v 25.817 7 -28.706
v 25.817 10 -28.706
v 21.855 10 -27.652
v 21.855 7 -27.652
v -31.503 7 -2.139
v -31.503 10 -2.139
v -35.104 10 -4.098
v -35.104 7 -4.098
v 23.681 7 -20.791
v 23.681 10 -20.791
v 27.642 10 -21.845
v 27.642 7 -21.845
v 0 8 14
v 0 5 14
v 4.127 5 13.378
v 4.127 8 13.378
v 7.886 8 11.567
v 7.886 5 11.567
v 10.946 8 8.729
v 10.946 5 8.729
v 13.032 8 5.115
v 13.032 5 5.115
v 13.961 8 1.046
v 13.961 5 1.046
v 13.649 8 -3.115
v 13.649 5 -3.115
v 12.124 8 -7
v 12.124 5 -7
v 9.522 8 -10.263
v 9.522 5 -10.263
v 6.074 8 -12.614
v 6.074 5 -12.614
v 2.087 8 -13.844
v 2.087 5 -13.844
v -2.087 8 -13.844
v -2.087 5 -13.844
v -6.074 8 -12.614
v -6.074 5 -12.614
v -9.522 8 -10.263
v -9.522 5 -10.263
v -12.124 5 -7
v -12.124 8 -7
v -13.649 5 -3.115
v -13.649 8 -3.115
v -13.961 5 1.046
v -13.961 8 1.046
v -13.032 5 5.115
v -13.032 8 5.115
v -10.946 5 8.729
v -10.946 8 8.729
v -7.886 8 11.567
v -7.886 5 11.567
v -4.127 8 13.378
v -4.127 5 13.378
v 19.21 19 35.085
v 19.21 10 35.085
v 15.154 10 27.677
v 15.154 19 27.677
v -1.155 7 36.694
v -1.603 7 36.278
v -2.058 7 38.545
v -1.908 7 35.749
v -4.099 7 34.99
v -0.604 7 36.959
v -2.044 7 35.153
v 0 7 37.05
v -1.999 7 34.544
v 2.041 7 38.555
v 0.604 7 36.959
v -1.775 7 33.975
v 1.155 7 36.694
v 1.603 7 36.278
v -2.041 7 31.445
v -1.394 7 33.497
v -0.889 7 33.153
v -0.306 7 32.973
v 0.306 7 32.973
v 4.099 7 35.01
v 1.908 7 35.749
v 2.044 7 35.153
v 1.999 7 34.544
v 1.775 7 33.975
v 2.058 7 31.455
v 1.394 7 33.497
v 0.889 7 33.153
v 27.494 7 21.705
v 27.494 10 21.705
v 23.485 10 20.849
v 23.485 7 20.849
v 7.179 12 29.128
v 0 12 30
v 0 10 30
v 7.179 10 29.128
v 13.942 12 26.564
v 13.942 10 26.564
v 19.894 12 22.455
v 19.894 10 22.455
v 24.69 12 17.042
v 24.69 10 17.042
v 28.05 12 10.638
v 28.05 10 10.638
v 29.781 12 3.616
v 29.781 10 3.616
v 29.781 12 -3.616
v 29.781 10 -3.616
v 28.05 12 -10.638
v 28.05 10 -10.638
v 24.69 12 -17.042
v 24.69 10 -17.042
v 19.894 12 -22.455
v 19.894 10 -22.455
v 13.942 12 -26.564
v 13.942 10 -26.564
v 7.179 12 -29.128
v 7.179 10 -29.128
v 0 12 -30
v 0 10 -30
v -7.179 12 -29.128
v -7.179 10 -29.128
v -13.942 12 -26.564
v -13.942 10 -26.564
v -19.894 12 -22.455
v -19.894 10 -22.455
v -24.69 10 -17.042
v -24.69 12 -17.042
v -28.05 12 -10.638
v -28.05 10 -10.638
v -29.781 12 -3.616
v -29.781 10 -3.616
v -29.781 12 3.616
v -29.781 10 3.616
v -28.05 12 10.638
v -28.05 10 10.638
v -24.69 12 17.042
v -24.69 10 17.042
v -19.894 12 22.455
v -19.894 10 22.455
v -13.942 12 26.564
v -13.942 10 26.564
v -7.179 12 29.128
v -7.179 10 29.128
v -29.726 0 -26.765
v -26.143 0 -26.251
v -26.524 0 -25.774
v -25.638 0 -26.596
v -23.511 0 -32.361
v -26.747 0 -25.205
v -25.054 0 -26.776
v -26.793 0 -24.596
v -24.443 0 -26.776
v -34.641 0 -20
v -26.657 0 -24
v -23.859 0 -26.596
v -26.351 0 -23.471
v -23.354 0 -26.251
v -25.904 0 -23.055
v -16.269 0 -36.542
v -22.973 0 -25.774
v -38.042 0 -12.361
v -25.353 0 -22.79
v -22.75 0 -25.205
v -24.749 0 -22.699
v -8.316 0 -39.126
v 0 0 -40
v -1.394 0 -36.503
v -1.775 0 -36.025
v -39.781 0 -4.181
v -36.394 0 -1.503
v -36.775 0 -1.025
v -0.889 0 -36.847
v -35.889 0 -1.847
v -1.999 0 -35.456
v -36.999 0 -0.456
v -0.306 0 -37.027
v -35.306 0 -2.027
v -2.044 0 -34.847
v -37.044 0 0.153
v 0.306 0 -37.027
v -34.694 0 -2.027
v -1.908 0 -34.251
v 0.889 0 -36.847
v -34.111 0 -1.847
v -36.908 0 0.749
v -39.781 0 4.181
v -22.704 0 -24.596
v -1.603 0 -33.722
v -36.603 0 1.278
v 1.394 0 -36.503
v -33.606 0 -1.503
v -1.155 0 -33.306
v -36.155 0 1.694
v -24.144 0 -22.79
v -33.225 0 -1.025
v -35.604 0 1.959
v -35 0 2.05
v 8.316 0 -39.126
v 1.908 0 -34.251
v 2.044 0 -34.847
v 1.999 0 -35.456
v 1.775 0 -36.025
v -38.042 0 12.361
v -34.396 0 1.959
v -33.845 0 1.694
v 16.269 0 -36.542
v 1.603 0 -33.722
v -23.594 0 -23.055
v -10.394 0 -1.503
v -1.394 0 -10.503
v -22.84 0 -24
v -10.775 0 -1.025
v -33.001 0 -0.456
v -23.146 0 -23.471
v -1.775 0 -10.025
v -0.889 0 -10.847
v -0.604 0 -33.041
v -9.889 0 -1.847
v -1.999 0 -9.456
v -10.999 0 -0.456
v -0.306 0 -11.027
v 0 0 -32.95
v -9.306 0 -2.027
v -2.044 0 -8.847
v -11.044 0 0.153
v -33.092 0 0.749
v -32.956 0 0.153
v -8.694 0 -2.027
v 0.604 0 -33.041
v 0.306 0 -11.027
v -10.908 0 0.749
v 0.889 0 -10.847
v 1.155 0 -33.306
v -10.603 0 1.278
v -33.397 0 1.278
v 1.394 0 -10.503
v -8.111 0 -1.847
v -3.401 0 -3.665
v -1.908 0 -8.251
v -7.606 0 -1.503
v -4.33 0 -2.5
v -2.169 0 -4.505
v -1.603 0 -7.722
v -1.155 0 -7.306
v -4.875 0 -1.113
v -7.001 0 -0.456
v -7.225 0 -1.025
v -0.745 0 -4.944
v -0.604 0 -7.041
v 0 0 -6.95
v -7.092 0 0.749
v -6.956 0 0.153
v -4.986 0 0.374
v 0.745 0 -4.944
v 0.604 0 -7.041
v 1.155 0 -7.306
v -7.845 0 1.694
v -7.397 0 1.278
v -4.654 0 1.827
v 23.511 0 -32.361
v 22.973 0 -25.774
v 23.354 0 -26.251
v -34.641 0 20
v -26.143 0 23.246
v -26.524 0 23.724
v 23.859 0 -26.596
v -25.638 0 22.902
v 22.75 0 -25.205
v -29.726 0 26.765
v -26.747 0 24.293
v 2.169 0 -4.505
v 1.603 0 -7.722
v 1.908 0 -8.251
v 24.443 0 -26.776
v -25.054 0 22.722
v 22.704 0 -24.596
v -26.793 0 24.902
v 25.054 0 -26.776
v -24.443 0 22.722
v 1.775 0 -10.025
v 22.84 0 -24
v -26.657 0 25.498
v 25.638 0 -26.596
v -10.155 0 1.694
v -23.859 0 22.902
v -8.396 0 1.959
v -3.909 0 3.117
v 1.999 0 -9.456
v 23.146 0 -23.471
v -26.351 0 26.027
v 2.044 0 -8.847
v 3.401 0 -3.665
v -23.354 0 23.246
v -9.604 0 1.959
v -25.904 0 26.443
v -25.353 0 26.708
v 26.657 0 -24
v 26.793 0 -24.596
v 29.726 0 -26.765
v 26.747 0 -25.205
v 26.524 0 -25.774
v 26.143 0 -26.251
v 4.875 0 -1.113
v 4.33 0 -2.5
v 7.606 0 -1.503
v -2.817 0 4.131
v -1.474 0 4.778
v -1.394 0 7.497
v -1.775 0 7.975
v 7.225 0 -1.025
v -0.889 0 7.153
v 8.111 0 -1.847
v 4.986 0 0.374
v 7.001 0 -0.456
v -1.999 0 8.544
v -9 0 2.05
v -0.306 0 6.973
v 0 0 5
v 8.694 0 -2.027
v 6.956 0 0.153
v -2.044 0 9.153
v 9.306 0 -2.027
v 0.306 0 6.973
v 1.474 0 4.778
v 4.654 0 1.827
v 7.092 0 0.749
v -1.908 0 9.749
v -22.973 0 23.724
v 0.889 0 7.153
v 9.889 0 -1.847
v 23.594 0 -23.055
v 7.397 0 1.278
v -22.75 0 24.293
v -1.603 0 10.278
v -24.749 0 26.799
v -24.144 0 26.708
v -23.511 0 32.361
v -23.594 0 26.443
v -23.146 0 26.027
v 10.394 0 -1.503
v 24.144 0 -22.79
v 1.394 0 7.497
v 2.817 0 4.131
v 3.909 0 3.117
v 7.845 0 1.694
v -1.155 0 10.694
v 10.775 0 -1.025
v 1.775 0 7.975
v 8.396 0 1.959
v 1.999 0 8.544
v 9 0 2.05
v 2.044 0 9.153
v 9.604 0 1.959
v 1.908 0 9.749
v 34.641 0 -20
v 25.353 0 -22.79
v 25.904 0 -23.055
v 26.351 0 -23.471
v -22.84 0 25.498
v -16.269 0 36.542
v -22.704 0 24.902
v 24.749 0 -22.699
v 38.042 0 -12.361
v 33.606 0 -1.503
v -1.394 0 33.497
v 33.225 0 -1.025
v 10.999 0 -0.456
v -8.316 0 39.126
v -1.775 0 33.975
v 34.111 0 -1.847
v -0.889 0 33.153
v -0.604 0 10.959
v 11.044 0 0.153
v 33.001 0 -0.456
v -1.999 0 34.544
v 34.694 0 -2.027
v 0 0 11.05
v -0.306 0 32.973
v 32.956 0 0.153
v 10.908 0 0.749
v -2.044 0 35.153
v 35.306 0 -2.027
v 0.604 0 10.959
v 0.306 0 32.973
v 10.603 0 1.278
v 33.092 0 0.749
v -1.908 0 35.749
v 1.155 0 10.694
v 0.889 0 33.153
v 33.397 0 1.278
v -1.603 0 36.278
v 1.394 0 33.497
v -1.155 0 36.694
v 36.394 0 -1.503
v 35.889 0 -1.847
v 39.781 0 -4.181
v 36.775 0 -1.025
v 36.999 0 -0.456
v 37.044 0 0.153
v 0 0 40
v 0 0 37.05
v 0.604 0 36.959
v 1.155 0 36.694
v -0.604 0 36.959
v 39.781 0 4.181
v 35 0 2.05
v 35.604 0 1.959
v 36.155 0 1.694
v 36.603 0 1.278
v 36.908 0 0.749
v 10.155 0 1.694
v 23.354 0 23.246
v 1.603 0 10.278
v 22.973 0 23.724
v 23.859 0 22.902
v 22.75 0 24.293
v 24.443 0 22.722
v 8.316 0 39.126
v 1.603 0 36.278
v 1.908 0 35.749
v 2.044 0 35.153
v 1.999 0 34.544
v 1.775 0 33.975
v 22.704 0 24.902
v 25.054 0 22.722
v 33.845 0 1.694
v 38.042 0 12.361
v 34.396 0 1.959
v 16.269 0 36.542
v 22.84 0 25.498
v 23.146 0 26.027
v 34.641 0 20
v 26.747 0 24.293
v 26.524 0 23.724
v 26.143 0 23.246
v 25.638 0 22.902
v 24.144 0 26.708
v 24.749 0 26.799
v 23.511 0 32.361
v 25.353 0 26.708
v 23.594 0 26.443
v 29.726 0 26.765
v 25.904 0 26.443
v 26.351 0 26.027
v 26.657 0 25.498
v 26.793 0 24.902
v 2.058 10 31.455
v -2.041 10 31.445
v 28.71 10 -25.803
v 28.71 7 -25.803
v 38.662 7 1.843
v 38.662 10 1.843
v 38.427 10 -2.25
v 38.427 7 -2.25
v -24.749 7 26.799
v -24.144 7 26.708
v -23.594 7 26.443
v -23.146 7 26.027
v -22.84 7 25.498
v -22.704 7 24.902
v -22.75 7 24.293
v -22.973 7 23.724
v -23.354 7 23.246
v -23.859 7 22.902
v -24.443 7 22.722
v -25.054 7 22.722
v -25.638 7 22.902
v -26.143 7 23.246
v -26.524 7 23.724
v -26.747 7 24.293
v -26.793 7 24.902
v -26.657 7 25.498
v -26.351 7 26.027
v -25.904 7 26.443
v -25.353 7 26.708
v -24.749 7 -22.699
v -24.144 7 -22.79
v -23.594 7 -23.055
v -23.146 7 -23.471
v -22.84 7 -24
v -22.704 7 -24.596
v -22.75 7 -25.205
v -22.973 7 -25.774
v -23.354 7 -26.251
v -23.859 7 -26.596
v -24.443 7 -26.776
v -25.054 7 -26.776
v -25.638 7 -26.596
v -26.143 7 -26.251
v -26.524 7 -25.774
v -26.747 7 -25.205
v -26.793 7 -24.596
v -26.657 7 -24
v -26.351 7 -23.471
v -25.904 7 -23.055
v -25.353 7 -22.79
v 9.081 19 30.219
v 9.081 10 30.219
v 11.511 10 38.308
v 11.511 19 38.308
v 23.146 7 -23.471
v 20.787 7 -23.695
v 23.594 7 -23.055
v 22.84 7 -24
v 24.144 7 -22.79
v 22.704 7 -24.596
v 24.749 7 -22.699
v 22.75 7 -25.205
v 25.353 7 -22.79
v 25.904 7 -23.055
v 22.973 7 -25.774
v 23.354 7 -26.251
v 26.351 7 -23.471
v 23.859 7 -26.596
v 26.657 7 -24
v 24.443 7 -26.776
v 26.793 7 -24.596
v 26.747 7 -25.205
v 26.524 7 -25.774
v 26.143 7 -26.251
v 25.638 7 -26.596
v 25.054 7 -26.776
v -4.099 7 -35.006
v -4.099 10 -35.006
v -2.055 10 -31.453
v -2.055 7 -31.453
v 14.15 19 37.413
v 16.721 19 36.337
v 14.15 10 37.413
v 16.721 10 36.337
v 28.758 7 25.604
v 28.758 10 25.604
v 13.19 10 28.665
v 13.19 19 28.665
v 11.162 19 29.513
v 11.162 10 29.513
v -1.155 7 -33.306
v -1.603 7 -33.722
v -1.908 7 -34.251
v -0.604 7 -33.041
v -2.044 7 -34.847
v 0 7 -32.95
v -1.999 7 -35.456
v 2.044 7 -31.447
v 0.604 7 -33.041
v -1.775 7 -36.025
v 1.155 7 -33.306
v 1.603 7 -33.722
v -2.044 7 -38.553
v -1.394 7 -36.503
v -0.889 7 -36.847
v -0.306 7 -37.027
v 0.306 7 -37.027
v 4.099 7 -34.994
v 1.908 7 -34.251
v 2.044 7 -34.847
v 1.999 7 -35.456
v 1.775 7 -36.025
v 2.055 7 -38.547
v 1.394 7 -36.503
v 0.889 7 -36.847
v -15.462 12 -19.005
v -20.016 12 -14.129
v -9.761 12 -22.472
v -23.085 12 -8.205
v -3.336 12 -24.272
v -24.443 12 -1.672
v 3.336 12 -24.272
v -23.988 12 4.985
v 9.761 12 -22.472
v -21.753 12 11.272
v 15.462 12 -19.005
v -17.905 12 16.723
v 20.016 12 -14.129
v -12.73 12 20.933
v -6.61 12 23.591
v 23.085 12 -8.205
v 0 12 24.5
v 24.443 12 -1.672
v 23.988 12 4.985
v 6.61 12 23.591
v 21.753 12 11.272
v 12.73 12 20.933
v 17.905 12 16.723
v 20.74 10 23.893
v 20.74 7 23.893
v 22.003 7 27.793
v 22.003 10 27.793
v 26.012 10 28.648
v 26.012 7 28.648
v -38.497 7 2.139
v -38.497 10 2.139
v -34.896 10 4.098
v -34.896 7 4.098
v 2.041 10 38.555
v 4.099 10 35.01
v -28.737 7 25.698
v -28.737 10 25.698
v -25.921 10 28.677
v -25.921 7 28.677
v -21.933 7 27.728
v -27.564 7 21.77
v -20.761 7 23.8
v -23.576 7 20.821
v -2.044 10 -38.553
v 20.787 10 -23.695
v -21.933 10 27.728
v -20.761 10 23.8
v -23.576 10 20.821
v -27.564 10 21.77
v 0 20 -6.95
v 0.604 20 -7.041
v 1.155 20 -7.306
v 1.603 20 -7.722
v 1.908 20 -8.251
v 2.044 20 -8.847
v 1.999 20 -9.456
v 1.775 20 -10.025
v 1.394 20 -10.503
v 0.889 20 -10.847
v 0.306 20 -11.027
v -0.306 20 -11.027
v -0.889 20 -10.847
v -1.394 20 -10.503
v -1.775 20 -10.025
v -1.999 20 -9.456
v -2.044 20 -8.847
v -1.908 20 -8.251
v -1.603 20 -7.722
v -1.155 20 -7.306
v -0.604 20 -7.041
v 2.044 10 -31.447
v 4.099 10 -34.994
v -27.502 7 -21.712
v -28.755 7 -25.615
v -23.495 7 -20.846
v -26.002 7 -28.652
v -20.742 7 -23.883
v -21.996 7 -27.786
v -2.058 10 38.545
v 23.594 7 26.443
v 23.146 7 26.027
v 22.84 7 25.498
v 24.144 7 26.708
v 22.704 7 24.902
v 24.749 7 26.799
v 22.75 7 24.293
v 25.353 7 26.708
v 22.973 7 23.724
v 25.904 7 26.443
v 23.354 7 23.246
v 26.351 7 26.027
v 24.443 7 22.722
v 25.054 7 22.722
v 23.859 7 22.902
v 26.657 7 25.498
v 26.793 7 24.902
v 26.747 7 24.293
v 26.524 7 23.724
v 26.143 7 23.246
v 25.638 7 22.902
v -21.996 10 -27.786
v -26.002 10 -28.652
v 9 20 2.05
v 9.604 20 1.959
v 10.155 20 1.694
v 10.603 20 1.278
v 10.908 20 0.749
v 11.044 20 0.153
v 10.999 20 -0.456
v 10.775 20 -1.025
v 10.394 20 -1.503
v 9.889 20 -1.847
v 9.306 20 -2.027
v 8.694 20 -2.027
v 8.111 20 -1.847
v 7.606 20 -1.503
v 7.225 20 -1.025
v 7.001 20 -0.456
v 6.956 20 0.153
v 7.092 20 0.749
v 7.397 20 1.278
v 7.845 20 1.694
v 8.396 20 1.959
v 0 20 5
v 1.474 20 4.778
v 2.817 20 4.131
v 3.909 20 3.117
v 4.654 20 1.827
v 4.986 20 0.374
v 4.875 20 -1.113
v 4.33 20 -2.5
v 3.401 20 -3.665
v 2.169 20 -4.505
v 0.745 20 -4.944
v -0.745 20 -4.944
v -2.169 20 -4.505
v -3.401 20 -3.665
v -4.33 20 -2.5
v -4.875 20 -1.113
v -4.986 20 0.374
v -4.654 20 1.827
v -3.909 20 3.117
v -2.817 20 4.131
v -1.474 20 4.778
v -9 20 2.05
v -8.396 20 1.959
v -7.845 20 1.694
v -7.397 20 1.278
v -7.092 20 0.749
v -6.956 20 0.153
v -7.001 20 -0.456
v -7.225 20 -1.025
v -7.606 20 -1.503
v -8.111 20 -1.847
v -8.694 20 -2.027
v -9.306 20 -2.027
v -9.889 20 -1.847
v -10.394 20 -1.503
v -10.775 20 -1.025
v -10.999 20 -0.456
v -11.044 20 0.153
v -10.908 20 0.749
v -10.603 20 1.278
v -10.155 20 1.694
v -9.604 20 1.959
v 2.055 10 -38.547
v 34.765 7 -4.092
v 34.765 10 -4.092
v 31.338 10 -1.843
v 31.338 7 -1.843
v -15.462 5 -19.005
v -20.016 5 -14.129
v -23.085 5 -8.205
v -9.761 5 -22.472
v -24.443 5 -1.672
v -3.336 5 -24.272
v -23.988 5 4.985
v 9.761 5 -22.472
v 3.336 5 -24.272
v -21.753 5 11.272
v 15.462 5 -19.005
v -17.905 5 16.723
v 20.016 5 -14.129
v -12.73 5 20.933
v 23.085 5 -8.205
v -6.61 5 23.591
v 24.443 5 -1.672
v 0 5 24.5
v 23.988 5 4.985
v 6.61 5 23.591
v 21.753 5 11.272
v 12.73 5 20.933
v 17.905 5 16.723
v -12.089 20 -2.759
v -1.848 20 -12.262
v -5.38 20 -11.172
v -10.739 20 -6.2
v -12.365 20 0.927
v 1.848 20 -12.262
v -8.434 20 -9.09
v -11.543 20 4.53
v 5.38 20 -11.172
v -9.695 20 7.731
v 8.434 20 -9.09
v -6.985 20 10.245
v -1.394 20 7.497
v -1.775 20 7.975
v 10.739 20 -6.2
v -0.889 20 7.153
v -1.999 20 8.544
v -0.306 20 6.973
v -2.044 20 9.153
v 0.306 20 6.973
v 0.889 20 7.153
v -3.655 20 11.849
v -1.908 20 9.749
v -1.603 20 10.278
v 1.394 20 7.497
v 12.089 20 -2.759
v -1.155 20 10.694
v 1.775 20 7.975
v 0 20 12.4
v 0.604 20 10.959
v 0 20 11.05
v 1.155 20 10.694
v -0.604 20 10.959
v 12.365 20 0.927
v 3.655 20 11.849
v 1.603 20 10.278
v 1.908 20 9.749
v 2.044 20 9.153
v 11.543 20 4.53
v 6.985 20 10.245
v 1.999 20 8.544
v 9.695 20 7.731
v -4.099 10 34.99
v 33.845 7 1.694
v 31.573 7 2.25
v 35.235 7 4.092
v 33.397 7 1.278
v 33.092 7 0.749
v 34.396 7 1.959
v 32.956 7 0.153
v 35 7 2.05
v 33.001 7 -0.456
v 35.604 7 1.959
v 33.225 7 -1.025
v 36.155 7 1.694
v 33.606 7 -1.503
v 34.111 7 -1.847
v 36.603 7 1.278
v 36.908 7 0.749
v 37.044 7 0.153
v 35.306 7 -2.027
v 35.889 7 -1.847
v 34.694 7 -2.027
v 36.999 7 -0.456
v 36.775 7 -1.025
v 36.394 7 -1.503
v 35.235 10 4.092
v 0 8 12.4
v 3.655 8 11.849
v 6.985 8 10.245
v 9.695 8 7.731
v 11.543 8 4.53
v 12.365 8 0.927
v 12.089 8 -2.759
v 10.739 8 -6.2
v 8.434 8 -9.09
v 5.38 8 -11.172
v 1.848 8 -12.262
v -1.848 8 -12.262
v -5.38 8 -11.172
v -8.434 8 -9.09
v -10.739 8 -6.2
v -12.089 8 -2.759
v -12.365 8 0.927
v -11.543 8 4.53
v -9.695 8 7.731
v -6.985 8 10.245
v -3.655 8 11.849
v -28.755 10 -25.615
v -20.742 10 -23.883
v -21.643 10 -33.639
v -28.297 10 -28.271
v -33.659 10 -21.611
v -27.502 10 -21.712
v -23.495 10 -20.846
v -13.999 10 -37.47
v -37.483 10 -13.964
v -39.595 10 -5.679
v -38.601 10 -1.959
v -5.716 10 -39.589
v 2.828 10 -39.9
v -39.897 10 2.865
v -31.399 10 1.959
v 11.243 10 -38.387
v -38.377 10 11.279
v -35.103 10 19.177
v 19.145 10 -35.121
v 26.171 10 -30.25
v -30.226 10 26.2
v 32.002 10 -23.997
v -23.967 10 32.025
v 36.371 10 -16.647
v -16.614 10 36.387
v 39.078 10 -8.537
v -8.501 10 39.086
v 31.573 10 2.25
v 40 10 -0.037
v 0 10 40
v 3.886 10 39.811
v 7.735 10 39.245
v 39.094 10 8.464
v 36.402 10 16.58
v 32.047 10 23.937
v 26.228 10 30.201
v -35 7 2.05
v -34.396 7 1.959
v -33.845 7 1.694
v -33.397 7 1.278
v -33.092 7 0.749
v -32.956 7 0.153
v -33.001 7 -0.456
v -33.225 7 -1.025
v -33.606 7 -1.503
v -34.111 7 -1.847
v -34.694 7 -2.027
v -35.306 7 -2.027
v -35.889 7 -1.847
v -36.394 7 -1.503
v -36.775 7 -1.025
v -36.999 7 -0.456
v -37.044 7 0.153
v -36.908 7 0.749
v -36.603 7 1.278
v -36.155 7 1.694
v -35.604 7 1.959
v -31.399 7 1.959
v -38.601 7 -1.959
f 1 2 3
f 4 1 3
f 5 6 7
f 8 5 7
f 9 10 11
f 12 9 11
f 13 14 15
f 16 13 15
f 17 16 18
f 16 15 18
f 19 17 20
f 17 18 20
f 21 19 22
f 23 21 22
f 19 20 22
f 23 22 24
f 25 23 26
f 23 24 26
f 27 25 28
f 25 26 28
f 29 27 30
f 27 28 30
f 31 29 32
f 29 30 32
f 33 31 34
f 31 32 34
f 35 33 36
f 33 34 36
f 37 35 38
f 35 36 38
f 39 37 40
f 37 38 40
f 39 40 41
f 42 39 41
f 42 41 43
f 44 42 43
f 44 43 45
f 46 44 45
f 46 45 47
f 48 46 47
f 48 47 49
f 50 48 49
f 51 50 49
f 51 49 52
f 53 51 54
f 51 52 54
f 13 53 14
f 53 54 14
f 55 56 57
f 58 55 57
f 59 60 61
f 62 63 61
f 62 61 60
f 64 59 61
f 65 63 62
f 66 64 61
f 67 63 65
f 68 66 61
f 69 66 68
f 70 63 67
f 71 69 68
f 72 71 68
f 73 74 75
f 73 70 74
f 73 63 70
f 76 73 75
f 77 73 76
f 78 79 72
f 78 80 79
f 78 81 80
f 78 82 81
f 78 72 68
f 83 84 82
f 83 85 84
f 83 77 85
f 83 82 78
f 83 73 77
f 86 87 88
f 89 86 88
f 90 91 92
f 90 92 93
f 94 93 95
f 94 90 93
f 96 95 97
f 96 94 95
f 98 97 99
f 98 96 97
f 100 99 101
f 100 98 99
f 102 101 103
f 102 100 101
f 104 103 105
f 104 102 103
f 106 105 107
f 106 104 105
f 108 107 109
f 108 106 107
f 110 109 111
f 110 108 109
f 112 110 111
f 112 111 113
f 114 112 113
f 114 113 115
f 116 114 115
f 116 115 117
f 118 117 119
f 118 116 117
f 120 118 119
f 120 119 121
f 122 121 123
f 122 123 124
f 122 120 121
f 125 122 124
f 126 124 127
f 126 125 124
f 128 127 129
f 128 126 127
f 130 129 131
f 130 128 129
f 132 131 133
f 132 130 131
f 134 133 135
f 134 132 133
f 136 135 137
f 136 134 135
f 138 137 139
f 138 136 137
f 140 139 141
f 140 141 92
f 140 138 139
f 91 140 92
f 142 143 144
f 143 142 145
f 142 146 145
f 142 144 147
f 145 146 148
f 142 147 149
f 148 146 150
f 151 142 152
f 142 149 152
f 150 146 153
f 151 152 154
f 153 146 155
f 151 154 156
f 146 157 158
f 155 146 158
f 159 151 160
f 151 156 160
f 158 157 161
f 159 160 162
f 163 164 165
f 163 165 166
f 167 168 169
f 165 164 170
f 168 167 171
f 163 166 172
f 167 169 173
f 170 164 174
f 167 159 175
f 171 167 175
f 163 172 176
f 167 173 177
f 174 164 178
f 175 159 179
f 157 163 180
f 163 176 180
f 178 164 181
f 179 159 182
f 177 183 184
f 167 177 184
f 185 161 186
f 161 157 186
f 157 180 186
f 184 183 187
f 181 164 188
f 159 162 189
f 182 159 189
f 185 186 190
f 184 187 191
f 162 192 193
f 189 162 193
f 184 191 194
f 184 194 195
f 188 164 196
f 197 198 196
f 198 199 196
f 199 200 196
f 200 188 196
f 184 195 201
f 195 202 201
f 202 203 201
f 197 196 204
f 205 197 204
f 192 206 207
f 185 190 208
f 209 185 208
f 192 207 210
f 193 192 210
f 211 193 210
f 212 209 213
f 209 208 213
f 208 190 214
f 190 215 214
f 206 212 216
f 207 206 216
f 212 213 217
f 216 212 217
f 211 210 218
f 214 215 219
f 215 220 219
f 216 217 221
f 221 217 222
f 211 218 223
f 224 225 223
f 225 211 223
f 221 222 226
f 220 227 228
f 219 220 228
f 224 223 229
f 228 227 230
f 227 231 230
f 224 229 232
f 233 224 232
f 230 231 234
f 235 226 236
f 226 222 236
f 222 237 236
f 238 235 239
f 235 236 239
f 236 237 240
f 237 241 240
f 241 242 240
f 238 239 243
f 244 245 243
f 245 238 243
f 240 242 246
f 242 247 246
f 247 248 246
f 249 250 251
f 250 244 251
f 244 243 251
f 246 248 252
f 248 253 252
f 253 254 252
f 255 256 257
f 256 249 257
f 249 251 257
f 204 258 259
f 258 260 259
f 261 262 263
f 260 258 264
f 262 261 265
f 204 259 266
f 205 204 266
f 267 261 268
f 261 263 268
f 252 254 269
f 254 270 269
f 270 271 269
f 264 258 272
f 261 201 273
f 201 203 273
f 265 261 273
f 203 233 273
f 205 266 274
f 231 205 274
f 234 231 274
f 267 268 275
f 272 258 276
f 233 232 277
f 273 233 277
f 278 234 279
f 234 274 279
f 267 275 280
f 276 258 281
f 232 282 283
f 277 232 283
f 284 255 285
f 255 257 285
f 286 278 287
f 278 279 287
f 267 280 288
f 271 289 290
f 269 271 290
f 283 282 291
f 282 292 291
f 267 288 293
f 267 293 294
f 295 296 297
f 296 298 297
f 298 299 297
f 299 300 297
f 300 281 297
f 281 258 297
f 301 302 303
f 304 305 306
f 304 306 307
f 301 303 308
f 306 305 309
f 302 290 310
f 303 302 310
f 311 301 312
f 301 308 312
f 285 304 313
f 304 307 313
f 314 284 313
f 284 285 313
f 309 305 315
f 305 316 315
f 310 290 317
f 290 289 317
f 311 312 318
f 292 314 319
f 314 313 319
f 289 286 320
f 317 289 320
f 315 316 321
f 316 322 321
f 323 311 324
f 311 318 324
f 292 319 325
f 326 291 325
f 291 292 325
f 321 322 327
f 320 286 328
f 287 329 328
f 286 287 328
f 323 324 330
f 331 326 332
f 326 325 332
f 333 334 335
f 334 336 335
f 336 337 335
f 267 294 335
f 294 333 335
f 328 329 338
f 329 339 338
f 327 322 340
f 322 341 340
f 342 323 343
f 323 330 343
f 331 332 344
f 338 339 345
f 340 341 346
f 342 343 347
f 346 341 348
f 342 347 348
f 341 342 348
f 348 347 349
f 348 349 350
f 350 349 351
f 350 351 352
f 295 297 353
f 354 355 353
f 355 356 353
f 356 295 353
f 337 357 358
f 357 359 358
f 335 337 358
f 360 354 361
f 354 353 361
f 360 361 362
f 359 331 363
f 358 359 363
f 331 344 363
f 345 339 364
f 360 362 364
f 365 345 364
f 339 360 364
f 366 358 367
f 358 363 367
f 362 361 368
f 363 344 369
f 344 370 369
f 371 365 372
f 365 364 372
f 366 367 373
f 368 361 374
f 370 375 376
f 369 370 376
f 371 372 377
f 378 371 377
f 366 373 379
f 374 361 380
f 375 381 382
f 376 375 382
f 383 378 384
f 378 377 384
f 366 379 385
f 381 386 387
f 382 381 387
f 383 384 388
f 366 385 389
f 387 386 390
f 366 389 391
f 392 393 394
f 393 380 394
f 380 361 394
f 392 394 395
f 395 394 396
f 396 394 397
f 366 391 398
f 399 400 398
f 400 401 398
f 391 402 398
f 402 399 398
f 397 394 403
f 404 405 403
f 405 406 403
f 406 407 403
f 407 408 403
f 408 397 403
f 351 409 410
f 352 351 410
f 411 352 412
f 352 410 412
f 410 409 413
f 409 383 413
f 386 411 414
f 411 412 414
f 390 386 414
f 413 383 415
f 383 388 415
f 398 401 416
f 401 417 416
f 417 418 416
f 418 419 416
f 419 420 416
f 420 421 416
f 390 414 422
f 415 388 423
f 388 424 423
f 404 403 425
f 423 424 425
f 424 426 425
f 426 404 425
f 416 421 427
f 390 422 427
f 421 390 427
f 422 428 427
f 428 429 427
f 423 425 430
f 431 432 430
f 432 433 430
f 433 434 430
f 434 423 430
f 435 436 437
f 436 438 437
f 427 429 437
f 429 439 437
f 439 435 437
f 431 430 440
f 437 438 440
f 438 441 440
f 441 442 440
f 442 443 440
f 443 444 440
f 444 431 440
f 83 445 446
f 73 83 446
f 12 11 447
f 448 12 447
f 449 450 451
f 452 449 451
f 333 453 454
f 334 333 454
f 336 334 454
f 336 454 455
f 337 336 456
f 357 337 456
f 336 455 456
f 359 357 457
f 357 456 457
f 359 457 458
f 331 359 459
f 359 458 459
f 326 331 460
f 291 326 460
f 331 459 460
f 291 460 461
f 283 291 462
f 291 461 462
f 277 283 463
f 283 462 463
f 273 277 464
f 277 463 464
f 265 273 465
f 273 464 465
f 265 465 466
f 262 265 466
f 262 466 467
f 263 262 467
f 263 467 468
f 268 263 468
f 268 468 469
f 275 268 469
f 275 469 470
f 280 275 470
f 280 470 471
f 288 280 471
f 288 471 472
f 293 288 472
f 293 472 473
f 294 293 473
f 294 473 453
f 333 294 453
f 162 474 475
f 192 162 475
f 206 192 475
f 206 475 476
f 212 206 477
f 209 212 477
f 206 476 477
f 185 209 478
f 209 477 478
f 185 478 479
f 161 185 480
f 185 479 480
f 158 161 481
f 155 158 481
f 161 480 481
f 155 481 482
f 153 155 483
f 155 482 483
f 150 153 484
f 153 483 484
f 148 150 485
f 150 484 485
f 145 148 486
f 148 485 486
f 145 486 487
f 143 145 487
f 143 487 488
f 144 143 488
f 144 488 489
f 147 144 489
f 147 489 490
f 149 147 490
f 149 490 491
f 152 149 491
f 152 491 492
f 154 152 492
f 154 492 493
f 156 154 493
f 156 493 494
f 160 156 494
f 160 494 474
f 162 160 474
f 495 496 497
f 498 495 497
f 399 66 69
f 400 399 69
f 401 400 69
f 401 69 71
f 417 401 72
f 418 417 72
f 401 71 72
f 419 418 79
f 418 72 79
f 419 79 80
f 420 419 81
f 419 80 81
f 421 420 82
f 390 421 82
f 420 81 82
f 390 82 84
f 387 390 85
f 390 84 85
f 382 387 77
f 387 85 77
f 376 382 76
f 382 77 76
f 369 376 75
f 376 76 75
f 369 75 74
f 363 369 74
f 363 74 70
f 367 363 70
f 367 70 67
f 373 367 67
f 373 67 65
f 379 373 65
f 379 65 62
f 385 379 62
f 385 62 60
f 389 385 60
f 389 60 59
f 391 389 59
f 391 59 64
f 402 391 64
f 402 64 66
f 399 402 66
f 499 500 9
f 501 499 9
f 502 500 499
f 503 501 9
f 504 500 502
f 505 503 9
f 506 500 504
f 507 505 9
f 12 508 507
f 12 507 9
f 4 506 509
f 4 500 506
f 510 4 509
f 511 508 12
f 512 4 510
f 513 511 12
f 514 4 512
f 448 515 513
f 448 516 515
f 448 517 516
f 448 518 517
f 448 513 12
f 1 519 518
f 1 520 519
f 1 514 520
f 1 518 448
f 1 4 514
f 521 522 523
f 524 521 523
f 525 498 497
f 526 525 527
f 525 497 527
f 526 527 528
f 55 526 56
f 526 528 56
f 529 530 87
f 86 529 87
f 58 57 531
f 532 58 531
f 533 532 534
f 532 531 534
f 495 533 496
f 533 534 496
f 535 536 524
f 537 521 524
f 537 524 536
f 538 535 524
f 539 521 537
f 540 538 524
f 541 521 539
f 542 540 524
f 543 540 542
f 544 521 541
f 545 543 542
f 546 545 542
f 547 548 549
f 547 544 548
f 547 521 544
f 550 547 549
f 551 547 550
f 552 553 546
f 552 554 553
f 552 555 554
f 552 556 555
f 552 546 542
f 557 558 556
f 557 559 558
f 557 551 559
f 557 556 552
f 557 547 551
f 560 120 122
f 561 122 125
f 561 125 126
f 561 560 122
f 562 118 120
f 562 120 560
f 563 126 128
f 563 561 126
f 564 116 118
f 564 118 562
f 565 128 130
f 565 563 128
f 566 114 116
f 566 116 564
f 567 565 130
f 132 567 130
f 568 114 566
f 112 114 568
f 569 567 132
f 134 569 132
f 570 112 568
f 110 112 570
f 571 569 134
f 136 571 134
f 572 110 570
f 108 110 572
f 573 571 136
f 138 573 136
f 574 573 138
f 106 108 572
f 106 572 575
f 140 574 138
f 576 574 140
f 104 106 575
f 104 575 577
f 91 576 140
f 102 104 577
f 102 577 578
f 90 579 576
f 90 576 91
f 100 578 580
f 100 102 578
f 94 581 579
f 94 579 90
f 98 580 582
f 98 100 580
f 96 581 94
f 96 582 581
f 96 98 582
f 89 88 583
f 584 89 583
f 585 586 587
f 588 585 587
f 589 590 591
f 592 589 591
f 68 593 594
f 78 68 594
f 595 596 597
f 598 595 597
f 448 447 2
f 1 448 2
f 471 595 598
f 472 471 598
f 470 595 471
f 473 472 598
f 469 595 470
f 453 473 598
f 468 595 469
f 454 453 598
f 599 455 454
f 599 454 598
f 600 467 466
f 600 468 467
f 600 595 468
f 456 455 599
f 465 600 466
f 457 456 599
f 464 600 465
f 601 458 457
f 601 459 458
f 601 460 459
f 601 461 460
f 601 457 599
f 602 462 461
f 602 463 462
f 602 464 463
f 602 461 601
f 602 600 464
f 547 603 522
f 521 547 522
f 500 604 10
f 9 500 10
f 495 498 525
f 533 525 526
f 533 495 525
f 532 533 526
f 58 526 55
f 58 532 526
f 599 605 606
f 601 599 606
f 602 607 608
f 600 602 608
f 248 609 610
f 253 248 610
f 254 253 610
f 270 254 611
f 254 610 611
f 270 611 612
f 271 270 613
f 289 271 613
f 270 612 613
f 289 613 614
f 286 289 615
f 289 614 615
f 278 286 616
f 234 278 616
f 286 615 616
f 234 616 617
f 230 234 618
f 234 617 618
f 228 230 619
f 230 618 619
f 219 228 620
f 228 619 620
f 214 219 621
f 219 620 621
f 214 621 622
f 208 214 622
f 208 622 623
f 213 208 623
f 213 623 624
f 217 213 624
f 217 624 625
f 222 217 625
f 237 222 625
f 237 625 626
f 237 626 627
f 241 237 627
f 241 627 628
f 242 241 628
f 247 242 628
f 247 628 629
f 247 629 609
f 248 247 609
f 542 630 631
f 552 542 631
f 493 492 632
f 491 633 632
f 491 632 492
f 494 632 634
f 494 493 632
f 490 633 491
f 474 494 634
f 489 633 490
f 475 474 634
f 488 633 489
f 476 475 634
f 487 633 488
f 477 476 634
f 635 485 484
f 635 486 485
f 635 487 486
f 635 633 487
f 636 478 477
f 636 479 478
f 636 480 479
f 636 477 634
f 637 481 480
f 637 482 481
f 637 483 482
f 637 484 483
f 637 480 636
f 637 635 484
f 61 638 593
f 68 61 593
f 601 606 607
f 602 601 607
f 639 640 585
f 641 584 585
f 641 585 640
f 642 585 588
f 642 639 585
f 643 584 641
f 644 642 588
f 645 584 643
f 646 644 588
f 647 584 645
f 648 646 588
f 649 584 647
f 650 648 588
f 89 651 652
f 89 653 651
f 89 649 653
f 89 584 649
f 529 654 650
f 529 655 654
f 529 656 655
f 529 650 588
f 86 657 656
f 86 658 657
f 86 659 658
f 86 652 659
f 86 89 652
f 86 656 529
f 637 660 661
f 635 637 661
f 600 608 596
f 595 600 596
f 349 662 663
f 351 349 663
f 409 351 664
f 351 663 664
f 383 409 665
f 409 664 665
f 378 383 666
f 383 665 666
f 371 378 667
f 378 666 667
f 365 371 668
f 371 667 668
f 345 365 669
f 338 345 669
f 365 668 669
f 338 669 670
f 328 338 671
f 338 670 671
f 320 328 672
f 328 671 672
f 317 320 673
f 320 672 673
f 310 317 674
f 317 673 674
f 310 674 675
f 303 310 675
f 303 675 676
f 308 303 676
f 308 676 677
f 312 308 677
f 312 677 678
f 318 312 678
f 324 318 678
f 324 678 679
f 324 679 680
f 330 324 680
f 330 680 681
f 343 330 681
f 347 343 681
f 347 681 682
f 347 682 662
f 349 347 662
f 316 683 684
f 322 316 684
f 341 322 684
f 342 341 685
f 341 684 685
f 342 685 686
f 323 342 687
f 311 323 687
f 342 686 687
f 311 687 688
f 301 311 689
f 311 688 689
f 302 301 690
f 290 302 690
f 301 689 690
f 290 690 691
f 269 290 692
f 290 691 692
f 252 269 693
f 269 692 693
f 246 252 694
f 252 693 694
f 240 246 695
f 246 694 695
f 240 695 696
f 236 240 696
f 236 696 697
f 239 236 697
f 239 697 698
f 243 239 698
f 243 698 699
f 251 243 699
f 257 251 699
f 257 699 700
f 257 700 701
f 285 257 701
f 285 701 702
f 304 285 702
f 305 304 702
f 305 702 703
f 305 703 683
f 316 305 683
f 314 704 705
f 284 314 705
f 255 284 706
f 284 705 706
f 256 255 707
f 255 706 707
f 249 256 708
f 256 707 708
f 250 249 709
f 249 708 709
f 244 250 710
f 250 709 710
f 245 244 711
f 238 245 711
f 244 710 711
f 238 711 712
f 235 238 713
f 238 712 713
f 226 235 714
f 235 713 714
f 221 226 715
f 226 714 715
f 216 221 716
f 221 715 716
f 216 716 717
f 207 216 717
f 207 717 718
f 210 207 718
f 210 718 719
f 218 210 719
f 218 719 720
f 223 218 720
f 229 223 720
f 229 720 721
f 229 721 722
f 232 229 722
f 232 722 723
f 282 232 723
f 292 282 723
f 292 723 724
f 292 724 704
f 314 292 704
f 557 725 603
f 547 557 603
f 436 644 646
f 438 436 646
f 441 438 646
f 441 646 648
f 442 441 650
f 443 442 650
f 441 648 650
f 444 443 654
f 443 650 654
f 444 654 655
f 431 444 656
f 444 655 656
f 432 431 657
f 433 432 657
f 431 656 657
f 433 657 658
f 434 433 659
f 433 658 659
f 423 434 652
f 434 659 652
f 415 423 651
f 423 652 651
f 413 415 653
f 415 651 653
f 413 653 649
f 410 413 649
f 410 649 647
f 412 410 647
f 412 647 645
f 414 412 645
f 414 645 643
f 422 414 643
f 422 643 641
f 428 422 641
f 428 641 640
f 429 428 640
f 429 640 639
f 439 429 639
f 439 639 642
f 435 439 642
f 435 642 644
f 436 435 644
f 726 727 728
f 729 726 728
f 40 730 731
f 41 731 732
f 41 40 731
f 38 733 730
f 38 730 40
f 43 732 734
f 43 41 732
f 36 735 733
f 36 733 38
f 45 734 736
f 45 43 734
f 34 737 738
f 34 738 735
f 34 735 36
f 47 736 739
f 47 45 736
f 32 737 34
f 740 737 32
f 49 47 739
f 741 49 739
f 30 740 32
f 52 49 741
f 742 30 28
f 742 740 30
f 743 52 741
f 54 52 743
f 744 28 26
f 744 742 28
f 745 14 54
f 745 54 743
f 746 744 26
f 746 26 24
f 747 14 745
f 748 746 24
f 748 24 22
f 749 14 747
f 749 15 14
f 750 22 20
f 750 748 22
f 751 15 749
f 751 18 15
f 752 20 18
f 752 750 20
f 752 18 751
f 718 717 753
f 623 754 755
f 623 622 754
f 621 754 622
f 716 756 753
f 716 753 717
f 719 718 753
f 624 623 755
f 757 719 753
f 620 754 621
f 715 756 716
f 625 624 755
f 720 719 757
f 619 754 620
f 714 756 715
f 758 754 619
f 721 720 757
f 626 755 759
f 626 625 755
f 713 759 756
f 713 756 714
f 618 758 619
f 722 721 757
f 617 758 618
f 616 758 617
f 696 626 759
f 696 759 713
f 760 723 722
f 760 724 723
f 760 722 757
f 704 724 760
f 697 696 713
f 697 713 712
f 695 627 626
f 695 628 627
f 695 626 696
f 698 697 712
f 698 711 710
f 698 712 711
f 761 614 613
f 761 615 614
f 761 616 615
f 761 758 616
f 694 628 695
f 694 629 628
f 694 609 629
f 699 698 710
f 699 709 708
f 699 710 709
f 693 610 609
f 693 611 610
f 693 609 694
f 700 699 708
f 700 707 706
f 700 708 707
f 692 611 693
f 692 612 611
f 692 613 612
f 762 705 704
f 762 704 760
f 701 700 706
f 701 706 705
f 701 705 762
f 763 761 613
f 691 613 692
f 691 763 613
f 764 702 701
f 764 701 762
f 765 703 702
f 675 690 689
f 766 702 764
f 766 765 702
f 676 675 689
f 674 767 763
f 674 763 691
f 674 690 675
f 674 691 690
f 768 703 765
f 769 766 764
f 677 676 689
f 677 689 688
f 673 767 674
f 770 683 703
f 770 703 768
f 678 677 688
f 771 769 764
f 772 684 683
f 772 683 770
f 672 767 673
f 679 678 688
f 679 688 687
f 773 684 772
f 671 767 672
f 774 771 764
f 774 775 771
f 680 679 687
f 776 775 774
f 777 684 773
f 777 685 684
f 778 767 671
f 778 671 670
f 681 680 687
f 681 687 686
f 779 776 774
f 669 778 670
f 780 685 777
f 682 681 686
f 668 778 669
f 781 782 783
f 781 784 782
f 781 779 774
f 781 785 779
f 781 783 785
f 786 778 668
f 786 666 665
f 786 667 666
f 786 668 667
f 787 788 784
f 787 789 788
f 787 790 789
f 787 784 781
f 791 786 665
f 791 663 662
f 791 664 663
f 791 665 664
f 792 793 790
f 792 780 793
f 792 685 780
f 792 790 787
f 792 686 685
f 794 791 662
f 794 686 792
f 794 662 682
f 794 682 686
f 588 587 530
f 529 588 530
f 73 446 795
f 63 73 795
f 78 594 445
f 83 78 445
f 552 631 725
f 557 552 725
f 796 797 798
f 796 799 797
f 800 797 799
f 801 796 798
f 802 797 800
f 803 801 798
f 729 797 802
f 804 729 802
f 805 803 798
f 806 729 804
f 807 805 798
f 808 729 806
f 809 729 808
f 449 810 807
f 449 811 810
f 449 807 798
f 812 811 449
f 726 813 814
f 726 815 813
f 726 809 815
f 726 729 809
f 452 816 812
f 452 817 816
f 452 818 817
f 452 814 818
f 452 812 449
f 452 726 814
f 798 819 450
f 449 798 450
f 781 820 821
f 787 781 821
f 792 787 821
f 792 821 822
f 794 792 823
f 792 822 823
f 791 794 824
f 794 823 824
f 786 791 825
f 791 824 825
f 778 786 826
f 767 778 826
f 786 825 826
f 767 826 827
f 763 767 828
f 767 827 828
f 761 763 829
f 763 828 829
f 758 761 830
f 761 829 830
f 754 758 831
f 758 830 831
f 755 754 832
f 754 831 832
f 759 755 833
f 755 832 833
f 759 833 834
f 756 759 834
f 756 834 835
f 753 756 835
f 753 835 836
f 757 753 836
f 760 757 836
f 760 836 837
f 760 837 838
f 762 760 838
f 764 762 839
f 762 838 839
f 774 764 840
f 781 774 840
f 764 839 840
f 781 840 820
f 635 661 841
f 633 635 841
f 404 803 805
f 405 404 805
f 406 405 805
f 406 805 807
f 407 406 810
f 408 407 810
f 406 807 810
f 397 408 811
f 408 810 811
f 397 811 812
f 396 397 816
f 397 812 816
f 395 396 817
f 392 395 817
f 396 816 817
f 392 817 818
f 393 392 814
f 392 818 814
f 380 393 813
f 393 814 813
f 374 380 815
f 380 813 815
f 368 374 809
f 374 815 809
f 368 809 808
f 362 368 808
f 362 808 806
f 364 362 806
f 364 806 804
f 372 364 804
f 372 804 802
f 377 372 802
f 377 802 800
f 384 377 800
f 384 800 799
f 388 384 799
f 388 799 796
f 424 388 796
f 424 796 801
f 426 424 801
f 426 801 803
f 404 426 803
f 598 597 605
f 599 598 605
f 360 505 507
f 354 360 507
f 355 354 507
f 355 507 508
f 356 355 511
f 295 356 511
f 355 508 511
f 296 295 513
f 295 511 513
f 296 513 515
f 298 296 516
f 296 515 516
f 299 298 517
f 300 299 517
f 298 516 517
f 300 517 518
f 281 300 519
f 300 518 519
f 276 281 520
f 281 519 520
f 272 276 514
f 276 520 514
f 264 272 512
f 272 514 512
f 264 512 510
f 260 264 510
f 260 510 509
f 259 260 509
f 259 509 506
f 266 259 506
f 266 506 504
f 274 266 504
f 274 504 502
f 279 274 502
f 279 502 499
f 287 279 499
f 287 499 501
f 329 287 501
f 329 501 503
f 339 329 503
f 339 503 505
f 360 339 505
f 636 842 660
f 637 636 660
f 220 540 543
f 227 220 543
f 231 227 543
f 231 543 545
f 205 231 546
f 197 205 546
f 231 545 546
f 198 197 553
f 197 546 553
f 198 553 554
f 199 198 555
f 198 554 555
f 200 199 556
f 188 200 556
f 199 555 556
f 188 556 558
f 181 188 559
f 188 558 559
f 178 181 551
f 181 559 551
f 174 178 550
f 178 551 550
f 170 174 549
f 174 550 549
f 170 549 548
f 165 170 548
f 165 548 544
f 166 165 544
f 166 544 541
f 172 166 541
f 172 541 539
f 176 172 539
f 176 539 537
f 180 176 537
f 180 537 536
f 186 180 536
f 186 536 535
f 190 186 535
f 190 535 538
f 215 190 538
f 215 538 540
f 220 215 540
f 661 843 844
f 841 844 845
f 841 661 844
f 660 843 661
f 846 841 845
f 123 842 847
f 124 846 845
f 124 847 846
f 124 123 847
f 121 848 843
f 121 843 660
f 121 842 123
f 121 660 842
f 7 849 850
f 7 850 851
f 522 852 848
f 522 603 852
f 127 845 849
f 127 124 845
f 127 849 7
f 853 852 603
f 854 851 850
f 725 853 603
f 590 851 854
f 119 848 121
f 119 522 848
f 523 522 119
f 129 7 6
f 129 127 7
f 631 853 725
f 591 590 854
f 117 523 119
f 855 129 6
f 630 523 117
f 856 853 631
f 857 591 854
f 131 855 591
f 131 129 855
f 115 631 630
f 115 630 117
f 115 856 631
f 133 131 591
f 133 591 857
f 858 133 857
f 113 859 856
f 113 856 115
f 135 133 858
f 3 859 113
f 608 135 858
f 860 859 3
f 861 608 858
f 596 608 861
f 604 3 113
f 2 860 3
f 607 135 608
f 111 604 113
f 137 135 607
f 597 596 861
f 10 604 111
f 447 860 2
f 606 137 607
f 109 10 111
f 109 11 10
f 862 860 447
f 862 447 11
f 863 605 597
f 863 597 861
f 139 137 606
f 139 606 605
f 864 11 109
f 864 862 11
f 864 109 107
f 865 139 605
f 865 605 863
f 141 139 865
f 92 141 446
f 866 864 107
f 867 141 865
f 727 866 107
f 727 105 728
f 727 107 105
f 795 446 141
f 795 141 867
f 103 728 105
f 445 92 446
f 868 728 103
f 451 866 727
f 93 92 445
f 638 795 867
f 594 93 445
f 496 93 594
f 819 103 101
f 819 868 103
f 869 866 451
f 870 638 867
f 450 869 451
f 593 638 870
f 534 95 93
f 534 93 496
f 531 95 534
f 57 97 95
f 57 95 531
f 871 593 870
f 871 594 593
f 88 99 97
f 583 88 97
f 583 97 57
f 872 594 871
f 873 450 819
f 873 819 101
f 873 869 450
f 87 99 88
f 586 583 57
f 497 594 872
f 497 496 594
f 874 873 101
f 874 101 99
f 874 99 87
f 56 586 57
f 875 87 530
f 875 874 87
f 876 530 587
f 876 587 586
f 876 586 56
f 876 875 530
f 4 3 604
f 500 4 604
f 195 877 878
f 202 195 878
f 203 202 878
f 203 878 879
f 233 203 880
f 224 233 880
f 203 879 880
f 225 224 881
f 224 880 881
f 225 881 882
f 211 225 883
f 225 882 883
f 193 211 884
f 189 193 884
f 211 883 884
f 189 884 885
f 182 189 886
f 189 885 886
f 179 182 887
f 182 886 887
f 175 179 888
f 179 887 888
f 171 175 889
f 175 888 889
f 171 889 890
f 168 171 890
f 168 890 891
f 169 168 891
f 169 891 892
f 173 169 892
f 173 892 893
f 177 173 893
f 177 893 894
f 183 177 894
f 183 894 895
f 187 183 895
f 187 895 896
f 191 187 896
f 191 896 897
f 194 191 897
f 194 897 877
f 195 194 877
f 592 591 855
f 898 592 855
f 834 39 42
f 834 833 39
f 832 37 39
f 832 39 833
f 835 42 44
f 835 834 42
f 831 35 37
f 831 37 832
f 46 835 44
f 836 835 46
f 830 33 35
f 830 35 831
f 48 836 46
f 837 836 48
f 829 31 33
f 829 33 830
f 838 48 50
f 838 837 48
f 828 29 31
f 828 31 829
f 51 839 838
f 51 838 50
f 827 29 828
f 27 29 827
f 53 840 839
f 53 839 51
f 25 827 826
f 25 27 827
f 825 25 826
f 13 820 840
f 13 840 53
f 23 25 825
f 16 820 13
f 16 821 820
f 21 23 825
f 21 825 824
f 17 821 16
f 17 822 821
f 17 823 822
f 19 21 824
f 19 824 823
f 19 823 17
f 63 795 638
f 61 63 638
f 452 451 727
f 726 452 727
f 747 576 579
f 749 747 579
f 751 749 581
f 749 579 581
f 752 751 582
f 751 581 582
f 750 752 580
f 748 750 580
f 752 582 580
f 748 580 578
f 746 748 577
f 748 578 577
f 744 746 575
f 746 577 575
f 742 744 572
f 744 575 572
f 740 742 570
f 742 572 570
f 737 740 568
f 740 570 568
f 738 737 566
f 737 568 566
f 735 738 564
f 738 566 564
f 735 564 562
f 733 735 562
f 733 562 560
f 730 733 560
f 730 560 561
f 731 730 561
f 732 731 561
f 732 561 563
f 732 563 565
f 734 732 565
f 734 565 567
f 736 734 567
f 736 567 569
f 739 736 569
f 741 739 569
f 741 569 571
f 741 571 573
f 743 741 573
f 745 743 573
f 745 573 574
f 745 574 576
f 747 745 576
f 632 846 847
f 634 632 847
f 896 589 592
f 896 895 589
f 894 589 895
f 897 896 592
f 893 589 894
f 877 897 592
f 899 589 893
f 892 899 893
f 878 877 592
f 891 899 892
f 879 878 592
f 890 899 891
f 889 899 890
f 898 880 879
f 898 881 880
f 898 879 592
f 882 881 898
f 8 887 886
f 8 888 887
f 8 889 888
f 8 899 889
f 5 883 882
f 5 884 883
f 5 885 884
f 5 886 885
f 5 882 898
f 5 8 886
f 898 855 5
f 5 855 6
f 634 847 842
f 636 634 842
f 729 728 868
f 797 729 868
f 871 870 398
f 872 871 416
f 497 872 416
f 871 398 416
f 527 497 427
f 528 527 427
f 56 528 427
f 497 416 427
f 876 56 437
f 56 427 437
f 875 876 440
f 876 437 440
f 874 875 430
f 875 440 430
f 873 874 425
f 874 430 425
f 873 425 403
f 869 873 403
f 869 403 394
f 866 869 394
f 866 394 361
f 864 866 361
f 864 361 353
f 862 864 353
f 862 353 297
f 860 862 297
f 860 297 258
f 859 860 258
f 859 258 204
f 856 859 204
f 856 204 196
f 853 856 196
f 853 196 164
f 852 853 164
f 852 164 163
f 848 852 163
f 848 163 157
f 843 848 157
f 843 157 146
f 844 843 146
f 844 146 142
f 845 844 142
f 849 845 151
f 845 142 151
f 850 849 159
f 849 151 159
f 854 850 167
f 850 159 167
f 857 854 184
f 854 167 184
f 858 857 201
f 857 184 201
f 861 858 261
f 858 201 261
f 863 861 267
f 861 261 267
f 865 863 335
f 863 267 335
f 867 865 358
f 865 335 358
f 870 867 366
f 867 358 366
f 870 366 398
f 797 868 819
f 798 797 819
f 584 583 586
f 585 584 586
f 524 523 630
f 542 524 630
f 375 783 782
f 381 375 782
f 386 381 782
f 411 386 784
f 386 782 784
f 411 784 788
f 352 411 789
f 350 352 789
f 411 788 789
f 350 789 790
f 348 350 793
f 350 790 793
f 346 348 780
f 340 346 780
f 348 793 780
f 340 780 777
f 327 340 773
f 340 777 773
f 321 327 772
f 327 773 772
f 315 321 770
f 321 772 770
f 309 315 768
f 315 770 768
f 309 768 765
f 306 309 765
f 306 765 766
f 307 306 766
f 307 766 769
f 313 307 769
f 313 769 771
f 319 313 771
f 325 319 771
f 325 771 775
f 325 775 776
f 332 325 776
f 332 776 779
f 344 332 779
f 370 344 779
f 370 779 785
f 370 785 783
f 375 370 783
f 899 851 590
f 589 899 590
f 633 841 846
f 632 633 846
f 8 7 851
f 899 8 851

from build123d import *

# Parameters (mm, degrees)
SKETCH1_R           = 40
BOSS_EXTRUDE1_DEPTH = 10
SKETCH2_R           = 24.5
CUT_EXTRUDE1_DEPTH  = 5
BOSS_EXTRUDE2_START = 2
SKETCH3_R           = 30
SKETCH3_R_2         = 24.5
BOSS_EXTRUDE2_DEPTH = 2
SKETCH4_R           = 14
BOSS_EXTRUDE3_DEPTH = 3
SKETCH5_R           = 12.4
BOSS_EXTRUDE4_DEPTH = 12
SKETCH6_R           = 2.05
CUT_EXTRUDE2_DEPTH  = 61
SKETCH7_R           = 5
CUT_EXTRUDE3_DEPTH  = 61
CUT_EXTRUDE6_REACH  = 59.446
SKETCH9_R           = 2.05
CUT_EXTRUDE7_DEPTH  = 3
BOSS_EXTRUDE5_DEPTH = 9


with BuildPart() as part:
    # Sketch1 → Boss-Extrude1 (new body)
    with BuildSketch(Plane(origin=(0, 0, 0), x_dir=(1, 0, 0), z_dir=(0, 1, 0))):
        with Locations(Location((0, 0, 0), (0, 0, 270))):
            Circle(SKETCH1_R)
    extrude(amount=BOSS_EXTRUDE1_DEPTH)

    # Sketch2 → Cut-Extrude1 (cut)
    with BuildSketch(Plane(origin=(0, 10, 0), x_dir=(1, 0, 0), z_dir=(0, 1, 0))):
        with Locations(Location((0, 0, 0), (0, 0, 270))):
            Circle(SKETCH2_R)
    extrude(amount=-CUT_EXTRUDE1_DEPTH, mode=Mode.SUBTRACT)

    # Sketch3 → Boss-Extrude2 (add)
    with BuildSketch(Plane(origin=(0, 10, 0), x_dir=(1, 0, 0), z_dir=(0, 1, 0)).offset(BOSS_EXTRUDE2_START)):
        with Locations(Location((0, 0, 0), (0, 0, 270))):
            Circle(SKETCH3_R)
        with Locations(Location((0, 0, 0), (0, 0, 270))):
            Circle(SKETCH3_R_2, mode=Mode.SUBTRACT)
    extrude(amount=-BOSS_EXTRUDE2_DEPTH)

    # Sketch4 → Boss-Extrude3 (add)
    with BuildSketch(Plane(origin=(0, 5, 0), x_dir=(1, 0, 0), z_dir=(0, 1, 0))):
        with Locations(Location((0, 0, 0), (0, 0, 270))):
            Circle(SKETCH4_R)
    extrude(amount=BOSS_EXTRUDE3_DEPTH)

    # Sketch5 → Boss-Extrude4 (add)
    with BuildSketch(Plane(origin=(0, 8, 0), x_dir=(1, 0, 0), z_dir=(0, 1, 0))):
        with Locations(Location((0, 0, 0), (0, 0, 270))):
            Circle(SKETCH5_R)
    extrude(amount=BOSS_EXTRUDE4_DEPTH)

    # Sketch6 → Cut-Extrude2 (cut, through all)
    with BuildSketch(Plane(origin=(0, 20, 0), x_dir=(1, 0, 0), z_dir=(0, 1, 0))):
        with Locations(Location((-9, 0, 0), (0, 0, 270))):
            Circle(SKETCH6_R)
        with Locations(Location((0, 9, 0), (0, 0, 270))):
            Circle(SKETCH6_R)
        with Locations(Location((9, 0, 0), (0, 0, 270))):
            Circle(SKETCH6_R)
        with Locations(Location((0, -9, 0), (0, 0, 270))):
            Circle(SKETCH6_R)
    extrude(amount=-CUT_EXTRUDE2_DEPTH, mode=Mode.SUBTRACT)

    # Sketch7 → Cut-Extrude3 (cut, through all)
    with BuildSketch(Plane(origin=(0, 20, 0), x_dir=(1, 0, 0), z_dir=(0, 1, 0))):
        with Locations(Location((0, 0, 0), (0, 0, 270))):
            Circle(SKETCH7_R)
    extrude(amount=-CUT_EXTRUDE3_DEPTH, mode=Mode.SUBTRACT)

    # Sketch9 → Cut-Extrude6 (cut, up to next)
    with BuildSketch(Plane(origin=(0, 10, 0), x_dir=(1, 0, 0), z_dir=(0, 1, 0)), mode=Mode.PRIVATE) as cut_extrude6_sk1:
        with Locations(Location((0, 35, 0), (0, 0, 270))):
            Circle(SKETCH9_R)
    cut_extrude6_tool1 = extrude(cut_extrude6_sk1.sketch, amount=-CUT_EXTRUDE6_REACH, mode=Mode.PRIVATE) & part.part
    # Sketch9 → Cut-Extrude6 (cut, up to next)
    with BuildSketch(Plane(origin=(0, 10, 0), x_dir=(1, 0, 0), z_dir=(0, 1, 0)), mode=Mode.PRIVATE) as cut_extrude6_sk2:
        with Locations(Location((35, 0, 0), (0, 0, 270))):
            Circle(SKETCH9_R)
    cut_extrude6_tool2 = extrude(cut_extrude6_sk2.sketch, amount=-CUT_EXTRUDE6_REACH, mode=Mode.PRIVATE) & part.part
    # Sketch9 → Cut-Extrude6 (cut, up to next)
    with BuildSketch(Plane(origin=(0, 10, 0), x_dir=(1, 0, 0), z_dir=(0, 1, 0)), mode=Mode.PRIVATE) as cut_extrude6_sk3:
        with Locations(Location((0, -35, 0), (0, 0, 270))):
            Circle(SKETCH9_R)
    cut_extrude6_tool3 = extrude(cut_extrude6_sk3.sketch, amount=-CUT_EXTRUDE6_REACH, mode=Mode.PRIVATE) & part.part
    # Sketch9 → Cut-Extrude6 (cut, up to next)
    with BuildSketch(Plane(origin=(0, 10, 0), x_dir=(1, 0, 0), z_dir=(0, 1, 0)), mode=Mode.PRIVATE) as cut_extrude6_sk4:
        with Locations(Location((-35, 0, 0), (0, 0, 270))):
            Circle(SKETCH9_R)
    cut_extrude6_tool4 = extrude(cut_extrude6_sk4.sketch, amount=-CUT_EXTRUDE6_REACH, mode=Mode.PRIVATE) & part.part
    # Sketch9 → Cut-Extrude6 (cut, up to next)
    with BuildSketch(Plane(origin=(0, 10, 0), x_dir=(1, 0, 0), z_dir=(0, 1, 0)), mode=Mode.PRIVATE) as cut_extrude6_sk5:
        with Locations(Location((-24.748737342, 24.748737342, 0), (0, 0, 270))):
            Circle(SKETCH9_R)
    cut_extrude6_tool5 = extrude(cut_extrude6_sk5.sketch, amount=-CUT_EXTRUDE6_REACH, mode=Mode.PRIVATE) & part.part
    # Sketch9 → Cut-Extrude6 (cut, up to next)
    with BuildSketch(Plane(origin=(0, 10, 0), x_dir=(1, 0, 0), z_dir=(0, 1, 0)), mode=Mode.PRIVATE) as cut_extrude6_sk6:
        with Locations(Location((24.748737342, 24.748737342, 0), (0, 0, 270))):
            Circle(SKETCH9_R)
    cut_extrude6_tool6 = extrude(cut_extrude6_sk6.sketch, amount=-CUT_EXTRUDE6_REACH, mode=Mode.PRIVATE) & part.part
    # Sketch9 → Cut-Extrude6 (cut, up to next)
    with BuildSketch(Plane(origin=(0, 10, 0), x_dir=(1, 0, 0), z_dir=(0, 1, 0)), mode=Mode.PRIVATE) as cut_extrude6_sk7:
        with Locations(Location((24.748737342, -24.748737342, 0), (0, 0, 270))):
            Circle(SKETCH9_R)
    cut_extrude6_tool7 = extrude(cut_extrude6_sk7.sketch, amount=-CUT_EXTRUDE6_REACH, mode=Mode.PRIVATE) & part.part
    # Sketch9 → Cut-Extrude6 (cut, up to next)
    with BuildSketch(Plane(origin=(0, 10, 0), x_dir=(1, 0, 0), z_dir=(0, 1, 0)), mode=Mode.PRIVATE) as cut_extrude6_sk8:
        with Locations(Location((-24.748737342, -24.748737342, 0), (0, 0, 270))):
            Circle(SKETCH9_R)
    cut_extrude6_tool8 = extrude(cut_extrude6_sk8.sketch, amount=-CUT_EXTRUDE6_REACH, mode=Mode.PRIVATE) & part.part
    add(cut_extrude6_tool1.solids().sort_by_distance((0, 10, -35))[0], mode=Mode.SUBTRACT)
    add(cut_extrude6_tool2.solids().sort_by_distance((35, 10, 0))[0], mode=Mode.SUBTRACT)
    add(cut_extrude6_tool3.solids().sort_by_distance((0, 10, 35))[0], mode=Mode.SUBTRACT)
    add(cut_extrude6_tool4.solids().sort_by_distance((-35, 10, 0))[0], mode=Mode.SUBTRACT)
    add(cut_extrude6_tool5.solids().sort_by_distance((-24.748737, 10, -24.748737))[0], mode=Mode.SUBTRACT)
    add(cut_extrude6_tool6.solids().sort_by_distance((24.748737, 10, -24.748737))[0], mode=Mode.SUBTRACT)
    add(cut_extrude6_tool7.solids().sort_by_distance((24.748737, 10, 24.748737))[0], mode=Mode.SUBTRACT)
    add(cut_extrude6_tool8.solids().sort_by_distance((-24.748737, 10, 24.748737))[0], mode=Mode.SUBTRACT)

    # Sketch10 → Cut-Extrude7 (cut)
    with BuildSketch(Plane(origin=(0, 10, 0), x_dir=(1, 0, 0), z_dir=(0, 1, 0))):
        Polygon((2.044293101, 31.44694511), (4.099182346, 34.993882313), (2.054889246, 38.546937203), (-2.044293101, 38.55305489), (-4.099182346, 35.006117687), (-2.054889246, 31.453062797), align=None)
        Polygon((23.680683804, 20.791137693), (27.642092406, 21.844976021), (28.710145944, 25.802575669), (25.816790879, 28.70633699), (21.855382277, 27.652498662), (20.78732874, 23.694899014), align=None)
        Polygon((31.573449102, -2.24990717), (35.235201316, -4.09243371), (38.661752215, -1.84252654), (38.426550898, 2.24990717), (34.764798684, 4.09243371), (31.338247785, 1.84252654), align=None)
        Polygon((20.739798525, -23.89331762), (22.003452724, -27.792870338), (26.01239154, -28.648290059), (28.757676158, -25.604157063), (27.494021959, -21.704604345), (23.485083143, -20.849184624), align=None)
        Polygon((2.058274344, -31.455026085), (-2.040900294, -31.444995172), (-4.099174638, -34.989969087), (-2.058274344, -38.544973915), (2.040900294, -38.555004828), (4.099174638, -35.010030913), align=None)
        Polygon((-20.760867622, -23.799933658), (-23.576490575, -20.820739015), (-27.564360295, -21.769542699), (-28.736607062, -25.697541025), (-25.920984108, -28.676735668), (-21.933114388, -27.727931984), align=None)
        Polygon((-31.399076536, -1.958745399), (-31.503214993, 2.139118497), (-35.104138457, 4.097863897), (-38.600923464, 1.958745399), (-38.496785007, -2.139118497), (-34.895861543, -4.097863897), align=None)
        Polygon((-23.495263392, 20.845900375), (-20.742044406, 23.882859142), (-21.995518356, 27.785696109), (-26.002211292, 28.651574308), (-28.755430277, 25.614615541), (-27.501956327, 21.711778574), align=None)
    extrude(amount=-CUT_EXTRUDE7_DEPTH, mode=Mode.SUBTRACT)

    # Sketch11 → Boss-Extrude5 (add)
    with BuildSketch(Plane(origin=(0, 10, 0), x_dir=(1, 0, 0), z_dir=(0, 1, 0))):
        with BuildLine():
            Line((9.080620819, -30.218963387), (11.511280004, -38.307837745))
            ThreePointArc((11.511280004, -38.307837745), (15.444999622, -36.897858836), (19.210154537, -35.085181525))
            Line((19.210154537, -35.085181525), (15.153842941, -27.676785701))
            ThreePointArc((15.153842941, -27.676785701), (12.18371763, -29.106707944), (9.080620819, -30.218963387))
        make_face()
    extrude(amount=BOSS_EXTRUDE5_DEPTH)


solid = part.part
